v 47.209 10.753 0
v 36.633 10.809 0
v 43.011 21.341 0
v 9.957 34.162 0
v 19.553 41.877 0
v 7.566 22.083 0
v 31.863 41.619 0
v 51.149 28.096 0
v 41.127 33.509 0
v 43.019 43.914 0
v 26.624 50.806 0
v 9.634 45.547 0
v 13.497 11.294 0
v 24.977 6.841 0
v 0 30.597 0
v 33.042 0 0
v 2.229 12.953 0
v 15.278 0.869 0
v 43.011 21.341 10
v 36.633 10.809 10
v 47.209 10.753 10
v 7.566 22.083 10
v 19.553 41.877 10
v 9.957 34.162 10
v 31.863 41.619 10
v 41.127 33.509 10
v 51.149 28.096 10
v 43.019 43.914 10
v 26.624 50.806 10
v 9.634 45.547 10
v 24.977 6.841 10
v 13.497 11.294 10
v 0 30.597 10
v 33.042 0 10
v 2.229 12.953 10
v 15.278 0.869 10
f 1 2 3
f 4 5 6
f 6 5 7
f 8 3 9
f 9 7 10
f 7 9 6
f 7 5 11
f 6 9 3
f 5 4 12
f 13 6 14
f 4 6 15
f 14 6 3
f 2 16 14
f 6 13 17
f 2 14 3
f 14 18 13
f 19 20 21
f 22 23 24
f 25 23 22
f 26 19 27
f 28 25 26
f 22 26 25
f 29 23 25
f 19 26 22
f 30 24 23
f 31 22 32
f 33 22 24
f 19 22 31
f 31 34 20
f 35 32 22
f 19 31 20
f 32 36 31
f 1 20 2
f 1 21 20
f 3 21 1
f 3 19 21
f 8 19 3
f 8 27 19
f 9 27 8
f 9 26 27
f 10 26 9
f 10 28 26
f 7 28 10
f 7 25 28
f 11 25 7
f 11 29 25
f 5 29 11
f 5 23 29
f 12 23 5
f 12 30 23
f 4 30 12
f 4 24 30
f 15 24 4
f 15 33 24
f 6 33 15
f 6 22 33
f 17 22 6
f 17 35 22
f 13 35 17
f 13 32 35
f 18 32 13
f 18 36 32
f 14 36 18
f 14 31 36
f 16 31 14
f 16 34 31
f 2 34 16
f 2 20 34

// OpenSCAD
$fn = 32;

// ----------------------------------------------------------------------
// Chain sprocket: 9 teeth, 18 mm root radius
// ----------------------------------------------------------------------

// --- parameters (mm) ---
profile_height = 10;      // extrusion height
profile_points = 18;      // points of the closed outline

profile = [[43.011, 21.341], [51.149, 28.096], [41.127, 33.509], [43.019, 43.914], [31.863, 41.619], [26.624, 50.806], [19.553, 41.877], [9.634, 45.547], [9.957, 34.162], [0, 30.597], [7.566, 22.083], [2.229, 12.953], [13.497, 11.294], [15.278, 0.869], [24.977, 6.841], [33.042, 0], [36.633, 10.809], [47.209, 10.753]];  // single closed polygon, 18 points, counter clockwise

// --- the one profile operation ---
linear_extrude(height = profile_height) polygon(points = profile);
